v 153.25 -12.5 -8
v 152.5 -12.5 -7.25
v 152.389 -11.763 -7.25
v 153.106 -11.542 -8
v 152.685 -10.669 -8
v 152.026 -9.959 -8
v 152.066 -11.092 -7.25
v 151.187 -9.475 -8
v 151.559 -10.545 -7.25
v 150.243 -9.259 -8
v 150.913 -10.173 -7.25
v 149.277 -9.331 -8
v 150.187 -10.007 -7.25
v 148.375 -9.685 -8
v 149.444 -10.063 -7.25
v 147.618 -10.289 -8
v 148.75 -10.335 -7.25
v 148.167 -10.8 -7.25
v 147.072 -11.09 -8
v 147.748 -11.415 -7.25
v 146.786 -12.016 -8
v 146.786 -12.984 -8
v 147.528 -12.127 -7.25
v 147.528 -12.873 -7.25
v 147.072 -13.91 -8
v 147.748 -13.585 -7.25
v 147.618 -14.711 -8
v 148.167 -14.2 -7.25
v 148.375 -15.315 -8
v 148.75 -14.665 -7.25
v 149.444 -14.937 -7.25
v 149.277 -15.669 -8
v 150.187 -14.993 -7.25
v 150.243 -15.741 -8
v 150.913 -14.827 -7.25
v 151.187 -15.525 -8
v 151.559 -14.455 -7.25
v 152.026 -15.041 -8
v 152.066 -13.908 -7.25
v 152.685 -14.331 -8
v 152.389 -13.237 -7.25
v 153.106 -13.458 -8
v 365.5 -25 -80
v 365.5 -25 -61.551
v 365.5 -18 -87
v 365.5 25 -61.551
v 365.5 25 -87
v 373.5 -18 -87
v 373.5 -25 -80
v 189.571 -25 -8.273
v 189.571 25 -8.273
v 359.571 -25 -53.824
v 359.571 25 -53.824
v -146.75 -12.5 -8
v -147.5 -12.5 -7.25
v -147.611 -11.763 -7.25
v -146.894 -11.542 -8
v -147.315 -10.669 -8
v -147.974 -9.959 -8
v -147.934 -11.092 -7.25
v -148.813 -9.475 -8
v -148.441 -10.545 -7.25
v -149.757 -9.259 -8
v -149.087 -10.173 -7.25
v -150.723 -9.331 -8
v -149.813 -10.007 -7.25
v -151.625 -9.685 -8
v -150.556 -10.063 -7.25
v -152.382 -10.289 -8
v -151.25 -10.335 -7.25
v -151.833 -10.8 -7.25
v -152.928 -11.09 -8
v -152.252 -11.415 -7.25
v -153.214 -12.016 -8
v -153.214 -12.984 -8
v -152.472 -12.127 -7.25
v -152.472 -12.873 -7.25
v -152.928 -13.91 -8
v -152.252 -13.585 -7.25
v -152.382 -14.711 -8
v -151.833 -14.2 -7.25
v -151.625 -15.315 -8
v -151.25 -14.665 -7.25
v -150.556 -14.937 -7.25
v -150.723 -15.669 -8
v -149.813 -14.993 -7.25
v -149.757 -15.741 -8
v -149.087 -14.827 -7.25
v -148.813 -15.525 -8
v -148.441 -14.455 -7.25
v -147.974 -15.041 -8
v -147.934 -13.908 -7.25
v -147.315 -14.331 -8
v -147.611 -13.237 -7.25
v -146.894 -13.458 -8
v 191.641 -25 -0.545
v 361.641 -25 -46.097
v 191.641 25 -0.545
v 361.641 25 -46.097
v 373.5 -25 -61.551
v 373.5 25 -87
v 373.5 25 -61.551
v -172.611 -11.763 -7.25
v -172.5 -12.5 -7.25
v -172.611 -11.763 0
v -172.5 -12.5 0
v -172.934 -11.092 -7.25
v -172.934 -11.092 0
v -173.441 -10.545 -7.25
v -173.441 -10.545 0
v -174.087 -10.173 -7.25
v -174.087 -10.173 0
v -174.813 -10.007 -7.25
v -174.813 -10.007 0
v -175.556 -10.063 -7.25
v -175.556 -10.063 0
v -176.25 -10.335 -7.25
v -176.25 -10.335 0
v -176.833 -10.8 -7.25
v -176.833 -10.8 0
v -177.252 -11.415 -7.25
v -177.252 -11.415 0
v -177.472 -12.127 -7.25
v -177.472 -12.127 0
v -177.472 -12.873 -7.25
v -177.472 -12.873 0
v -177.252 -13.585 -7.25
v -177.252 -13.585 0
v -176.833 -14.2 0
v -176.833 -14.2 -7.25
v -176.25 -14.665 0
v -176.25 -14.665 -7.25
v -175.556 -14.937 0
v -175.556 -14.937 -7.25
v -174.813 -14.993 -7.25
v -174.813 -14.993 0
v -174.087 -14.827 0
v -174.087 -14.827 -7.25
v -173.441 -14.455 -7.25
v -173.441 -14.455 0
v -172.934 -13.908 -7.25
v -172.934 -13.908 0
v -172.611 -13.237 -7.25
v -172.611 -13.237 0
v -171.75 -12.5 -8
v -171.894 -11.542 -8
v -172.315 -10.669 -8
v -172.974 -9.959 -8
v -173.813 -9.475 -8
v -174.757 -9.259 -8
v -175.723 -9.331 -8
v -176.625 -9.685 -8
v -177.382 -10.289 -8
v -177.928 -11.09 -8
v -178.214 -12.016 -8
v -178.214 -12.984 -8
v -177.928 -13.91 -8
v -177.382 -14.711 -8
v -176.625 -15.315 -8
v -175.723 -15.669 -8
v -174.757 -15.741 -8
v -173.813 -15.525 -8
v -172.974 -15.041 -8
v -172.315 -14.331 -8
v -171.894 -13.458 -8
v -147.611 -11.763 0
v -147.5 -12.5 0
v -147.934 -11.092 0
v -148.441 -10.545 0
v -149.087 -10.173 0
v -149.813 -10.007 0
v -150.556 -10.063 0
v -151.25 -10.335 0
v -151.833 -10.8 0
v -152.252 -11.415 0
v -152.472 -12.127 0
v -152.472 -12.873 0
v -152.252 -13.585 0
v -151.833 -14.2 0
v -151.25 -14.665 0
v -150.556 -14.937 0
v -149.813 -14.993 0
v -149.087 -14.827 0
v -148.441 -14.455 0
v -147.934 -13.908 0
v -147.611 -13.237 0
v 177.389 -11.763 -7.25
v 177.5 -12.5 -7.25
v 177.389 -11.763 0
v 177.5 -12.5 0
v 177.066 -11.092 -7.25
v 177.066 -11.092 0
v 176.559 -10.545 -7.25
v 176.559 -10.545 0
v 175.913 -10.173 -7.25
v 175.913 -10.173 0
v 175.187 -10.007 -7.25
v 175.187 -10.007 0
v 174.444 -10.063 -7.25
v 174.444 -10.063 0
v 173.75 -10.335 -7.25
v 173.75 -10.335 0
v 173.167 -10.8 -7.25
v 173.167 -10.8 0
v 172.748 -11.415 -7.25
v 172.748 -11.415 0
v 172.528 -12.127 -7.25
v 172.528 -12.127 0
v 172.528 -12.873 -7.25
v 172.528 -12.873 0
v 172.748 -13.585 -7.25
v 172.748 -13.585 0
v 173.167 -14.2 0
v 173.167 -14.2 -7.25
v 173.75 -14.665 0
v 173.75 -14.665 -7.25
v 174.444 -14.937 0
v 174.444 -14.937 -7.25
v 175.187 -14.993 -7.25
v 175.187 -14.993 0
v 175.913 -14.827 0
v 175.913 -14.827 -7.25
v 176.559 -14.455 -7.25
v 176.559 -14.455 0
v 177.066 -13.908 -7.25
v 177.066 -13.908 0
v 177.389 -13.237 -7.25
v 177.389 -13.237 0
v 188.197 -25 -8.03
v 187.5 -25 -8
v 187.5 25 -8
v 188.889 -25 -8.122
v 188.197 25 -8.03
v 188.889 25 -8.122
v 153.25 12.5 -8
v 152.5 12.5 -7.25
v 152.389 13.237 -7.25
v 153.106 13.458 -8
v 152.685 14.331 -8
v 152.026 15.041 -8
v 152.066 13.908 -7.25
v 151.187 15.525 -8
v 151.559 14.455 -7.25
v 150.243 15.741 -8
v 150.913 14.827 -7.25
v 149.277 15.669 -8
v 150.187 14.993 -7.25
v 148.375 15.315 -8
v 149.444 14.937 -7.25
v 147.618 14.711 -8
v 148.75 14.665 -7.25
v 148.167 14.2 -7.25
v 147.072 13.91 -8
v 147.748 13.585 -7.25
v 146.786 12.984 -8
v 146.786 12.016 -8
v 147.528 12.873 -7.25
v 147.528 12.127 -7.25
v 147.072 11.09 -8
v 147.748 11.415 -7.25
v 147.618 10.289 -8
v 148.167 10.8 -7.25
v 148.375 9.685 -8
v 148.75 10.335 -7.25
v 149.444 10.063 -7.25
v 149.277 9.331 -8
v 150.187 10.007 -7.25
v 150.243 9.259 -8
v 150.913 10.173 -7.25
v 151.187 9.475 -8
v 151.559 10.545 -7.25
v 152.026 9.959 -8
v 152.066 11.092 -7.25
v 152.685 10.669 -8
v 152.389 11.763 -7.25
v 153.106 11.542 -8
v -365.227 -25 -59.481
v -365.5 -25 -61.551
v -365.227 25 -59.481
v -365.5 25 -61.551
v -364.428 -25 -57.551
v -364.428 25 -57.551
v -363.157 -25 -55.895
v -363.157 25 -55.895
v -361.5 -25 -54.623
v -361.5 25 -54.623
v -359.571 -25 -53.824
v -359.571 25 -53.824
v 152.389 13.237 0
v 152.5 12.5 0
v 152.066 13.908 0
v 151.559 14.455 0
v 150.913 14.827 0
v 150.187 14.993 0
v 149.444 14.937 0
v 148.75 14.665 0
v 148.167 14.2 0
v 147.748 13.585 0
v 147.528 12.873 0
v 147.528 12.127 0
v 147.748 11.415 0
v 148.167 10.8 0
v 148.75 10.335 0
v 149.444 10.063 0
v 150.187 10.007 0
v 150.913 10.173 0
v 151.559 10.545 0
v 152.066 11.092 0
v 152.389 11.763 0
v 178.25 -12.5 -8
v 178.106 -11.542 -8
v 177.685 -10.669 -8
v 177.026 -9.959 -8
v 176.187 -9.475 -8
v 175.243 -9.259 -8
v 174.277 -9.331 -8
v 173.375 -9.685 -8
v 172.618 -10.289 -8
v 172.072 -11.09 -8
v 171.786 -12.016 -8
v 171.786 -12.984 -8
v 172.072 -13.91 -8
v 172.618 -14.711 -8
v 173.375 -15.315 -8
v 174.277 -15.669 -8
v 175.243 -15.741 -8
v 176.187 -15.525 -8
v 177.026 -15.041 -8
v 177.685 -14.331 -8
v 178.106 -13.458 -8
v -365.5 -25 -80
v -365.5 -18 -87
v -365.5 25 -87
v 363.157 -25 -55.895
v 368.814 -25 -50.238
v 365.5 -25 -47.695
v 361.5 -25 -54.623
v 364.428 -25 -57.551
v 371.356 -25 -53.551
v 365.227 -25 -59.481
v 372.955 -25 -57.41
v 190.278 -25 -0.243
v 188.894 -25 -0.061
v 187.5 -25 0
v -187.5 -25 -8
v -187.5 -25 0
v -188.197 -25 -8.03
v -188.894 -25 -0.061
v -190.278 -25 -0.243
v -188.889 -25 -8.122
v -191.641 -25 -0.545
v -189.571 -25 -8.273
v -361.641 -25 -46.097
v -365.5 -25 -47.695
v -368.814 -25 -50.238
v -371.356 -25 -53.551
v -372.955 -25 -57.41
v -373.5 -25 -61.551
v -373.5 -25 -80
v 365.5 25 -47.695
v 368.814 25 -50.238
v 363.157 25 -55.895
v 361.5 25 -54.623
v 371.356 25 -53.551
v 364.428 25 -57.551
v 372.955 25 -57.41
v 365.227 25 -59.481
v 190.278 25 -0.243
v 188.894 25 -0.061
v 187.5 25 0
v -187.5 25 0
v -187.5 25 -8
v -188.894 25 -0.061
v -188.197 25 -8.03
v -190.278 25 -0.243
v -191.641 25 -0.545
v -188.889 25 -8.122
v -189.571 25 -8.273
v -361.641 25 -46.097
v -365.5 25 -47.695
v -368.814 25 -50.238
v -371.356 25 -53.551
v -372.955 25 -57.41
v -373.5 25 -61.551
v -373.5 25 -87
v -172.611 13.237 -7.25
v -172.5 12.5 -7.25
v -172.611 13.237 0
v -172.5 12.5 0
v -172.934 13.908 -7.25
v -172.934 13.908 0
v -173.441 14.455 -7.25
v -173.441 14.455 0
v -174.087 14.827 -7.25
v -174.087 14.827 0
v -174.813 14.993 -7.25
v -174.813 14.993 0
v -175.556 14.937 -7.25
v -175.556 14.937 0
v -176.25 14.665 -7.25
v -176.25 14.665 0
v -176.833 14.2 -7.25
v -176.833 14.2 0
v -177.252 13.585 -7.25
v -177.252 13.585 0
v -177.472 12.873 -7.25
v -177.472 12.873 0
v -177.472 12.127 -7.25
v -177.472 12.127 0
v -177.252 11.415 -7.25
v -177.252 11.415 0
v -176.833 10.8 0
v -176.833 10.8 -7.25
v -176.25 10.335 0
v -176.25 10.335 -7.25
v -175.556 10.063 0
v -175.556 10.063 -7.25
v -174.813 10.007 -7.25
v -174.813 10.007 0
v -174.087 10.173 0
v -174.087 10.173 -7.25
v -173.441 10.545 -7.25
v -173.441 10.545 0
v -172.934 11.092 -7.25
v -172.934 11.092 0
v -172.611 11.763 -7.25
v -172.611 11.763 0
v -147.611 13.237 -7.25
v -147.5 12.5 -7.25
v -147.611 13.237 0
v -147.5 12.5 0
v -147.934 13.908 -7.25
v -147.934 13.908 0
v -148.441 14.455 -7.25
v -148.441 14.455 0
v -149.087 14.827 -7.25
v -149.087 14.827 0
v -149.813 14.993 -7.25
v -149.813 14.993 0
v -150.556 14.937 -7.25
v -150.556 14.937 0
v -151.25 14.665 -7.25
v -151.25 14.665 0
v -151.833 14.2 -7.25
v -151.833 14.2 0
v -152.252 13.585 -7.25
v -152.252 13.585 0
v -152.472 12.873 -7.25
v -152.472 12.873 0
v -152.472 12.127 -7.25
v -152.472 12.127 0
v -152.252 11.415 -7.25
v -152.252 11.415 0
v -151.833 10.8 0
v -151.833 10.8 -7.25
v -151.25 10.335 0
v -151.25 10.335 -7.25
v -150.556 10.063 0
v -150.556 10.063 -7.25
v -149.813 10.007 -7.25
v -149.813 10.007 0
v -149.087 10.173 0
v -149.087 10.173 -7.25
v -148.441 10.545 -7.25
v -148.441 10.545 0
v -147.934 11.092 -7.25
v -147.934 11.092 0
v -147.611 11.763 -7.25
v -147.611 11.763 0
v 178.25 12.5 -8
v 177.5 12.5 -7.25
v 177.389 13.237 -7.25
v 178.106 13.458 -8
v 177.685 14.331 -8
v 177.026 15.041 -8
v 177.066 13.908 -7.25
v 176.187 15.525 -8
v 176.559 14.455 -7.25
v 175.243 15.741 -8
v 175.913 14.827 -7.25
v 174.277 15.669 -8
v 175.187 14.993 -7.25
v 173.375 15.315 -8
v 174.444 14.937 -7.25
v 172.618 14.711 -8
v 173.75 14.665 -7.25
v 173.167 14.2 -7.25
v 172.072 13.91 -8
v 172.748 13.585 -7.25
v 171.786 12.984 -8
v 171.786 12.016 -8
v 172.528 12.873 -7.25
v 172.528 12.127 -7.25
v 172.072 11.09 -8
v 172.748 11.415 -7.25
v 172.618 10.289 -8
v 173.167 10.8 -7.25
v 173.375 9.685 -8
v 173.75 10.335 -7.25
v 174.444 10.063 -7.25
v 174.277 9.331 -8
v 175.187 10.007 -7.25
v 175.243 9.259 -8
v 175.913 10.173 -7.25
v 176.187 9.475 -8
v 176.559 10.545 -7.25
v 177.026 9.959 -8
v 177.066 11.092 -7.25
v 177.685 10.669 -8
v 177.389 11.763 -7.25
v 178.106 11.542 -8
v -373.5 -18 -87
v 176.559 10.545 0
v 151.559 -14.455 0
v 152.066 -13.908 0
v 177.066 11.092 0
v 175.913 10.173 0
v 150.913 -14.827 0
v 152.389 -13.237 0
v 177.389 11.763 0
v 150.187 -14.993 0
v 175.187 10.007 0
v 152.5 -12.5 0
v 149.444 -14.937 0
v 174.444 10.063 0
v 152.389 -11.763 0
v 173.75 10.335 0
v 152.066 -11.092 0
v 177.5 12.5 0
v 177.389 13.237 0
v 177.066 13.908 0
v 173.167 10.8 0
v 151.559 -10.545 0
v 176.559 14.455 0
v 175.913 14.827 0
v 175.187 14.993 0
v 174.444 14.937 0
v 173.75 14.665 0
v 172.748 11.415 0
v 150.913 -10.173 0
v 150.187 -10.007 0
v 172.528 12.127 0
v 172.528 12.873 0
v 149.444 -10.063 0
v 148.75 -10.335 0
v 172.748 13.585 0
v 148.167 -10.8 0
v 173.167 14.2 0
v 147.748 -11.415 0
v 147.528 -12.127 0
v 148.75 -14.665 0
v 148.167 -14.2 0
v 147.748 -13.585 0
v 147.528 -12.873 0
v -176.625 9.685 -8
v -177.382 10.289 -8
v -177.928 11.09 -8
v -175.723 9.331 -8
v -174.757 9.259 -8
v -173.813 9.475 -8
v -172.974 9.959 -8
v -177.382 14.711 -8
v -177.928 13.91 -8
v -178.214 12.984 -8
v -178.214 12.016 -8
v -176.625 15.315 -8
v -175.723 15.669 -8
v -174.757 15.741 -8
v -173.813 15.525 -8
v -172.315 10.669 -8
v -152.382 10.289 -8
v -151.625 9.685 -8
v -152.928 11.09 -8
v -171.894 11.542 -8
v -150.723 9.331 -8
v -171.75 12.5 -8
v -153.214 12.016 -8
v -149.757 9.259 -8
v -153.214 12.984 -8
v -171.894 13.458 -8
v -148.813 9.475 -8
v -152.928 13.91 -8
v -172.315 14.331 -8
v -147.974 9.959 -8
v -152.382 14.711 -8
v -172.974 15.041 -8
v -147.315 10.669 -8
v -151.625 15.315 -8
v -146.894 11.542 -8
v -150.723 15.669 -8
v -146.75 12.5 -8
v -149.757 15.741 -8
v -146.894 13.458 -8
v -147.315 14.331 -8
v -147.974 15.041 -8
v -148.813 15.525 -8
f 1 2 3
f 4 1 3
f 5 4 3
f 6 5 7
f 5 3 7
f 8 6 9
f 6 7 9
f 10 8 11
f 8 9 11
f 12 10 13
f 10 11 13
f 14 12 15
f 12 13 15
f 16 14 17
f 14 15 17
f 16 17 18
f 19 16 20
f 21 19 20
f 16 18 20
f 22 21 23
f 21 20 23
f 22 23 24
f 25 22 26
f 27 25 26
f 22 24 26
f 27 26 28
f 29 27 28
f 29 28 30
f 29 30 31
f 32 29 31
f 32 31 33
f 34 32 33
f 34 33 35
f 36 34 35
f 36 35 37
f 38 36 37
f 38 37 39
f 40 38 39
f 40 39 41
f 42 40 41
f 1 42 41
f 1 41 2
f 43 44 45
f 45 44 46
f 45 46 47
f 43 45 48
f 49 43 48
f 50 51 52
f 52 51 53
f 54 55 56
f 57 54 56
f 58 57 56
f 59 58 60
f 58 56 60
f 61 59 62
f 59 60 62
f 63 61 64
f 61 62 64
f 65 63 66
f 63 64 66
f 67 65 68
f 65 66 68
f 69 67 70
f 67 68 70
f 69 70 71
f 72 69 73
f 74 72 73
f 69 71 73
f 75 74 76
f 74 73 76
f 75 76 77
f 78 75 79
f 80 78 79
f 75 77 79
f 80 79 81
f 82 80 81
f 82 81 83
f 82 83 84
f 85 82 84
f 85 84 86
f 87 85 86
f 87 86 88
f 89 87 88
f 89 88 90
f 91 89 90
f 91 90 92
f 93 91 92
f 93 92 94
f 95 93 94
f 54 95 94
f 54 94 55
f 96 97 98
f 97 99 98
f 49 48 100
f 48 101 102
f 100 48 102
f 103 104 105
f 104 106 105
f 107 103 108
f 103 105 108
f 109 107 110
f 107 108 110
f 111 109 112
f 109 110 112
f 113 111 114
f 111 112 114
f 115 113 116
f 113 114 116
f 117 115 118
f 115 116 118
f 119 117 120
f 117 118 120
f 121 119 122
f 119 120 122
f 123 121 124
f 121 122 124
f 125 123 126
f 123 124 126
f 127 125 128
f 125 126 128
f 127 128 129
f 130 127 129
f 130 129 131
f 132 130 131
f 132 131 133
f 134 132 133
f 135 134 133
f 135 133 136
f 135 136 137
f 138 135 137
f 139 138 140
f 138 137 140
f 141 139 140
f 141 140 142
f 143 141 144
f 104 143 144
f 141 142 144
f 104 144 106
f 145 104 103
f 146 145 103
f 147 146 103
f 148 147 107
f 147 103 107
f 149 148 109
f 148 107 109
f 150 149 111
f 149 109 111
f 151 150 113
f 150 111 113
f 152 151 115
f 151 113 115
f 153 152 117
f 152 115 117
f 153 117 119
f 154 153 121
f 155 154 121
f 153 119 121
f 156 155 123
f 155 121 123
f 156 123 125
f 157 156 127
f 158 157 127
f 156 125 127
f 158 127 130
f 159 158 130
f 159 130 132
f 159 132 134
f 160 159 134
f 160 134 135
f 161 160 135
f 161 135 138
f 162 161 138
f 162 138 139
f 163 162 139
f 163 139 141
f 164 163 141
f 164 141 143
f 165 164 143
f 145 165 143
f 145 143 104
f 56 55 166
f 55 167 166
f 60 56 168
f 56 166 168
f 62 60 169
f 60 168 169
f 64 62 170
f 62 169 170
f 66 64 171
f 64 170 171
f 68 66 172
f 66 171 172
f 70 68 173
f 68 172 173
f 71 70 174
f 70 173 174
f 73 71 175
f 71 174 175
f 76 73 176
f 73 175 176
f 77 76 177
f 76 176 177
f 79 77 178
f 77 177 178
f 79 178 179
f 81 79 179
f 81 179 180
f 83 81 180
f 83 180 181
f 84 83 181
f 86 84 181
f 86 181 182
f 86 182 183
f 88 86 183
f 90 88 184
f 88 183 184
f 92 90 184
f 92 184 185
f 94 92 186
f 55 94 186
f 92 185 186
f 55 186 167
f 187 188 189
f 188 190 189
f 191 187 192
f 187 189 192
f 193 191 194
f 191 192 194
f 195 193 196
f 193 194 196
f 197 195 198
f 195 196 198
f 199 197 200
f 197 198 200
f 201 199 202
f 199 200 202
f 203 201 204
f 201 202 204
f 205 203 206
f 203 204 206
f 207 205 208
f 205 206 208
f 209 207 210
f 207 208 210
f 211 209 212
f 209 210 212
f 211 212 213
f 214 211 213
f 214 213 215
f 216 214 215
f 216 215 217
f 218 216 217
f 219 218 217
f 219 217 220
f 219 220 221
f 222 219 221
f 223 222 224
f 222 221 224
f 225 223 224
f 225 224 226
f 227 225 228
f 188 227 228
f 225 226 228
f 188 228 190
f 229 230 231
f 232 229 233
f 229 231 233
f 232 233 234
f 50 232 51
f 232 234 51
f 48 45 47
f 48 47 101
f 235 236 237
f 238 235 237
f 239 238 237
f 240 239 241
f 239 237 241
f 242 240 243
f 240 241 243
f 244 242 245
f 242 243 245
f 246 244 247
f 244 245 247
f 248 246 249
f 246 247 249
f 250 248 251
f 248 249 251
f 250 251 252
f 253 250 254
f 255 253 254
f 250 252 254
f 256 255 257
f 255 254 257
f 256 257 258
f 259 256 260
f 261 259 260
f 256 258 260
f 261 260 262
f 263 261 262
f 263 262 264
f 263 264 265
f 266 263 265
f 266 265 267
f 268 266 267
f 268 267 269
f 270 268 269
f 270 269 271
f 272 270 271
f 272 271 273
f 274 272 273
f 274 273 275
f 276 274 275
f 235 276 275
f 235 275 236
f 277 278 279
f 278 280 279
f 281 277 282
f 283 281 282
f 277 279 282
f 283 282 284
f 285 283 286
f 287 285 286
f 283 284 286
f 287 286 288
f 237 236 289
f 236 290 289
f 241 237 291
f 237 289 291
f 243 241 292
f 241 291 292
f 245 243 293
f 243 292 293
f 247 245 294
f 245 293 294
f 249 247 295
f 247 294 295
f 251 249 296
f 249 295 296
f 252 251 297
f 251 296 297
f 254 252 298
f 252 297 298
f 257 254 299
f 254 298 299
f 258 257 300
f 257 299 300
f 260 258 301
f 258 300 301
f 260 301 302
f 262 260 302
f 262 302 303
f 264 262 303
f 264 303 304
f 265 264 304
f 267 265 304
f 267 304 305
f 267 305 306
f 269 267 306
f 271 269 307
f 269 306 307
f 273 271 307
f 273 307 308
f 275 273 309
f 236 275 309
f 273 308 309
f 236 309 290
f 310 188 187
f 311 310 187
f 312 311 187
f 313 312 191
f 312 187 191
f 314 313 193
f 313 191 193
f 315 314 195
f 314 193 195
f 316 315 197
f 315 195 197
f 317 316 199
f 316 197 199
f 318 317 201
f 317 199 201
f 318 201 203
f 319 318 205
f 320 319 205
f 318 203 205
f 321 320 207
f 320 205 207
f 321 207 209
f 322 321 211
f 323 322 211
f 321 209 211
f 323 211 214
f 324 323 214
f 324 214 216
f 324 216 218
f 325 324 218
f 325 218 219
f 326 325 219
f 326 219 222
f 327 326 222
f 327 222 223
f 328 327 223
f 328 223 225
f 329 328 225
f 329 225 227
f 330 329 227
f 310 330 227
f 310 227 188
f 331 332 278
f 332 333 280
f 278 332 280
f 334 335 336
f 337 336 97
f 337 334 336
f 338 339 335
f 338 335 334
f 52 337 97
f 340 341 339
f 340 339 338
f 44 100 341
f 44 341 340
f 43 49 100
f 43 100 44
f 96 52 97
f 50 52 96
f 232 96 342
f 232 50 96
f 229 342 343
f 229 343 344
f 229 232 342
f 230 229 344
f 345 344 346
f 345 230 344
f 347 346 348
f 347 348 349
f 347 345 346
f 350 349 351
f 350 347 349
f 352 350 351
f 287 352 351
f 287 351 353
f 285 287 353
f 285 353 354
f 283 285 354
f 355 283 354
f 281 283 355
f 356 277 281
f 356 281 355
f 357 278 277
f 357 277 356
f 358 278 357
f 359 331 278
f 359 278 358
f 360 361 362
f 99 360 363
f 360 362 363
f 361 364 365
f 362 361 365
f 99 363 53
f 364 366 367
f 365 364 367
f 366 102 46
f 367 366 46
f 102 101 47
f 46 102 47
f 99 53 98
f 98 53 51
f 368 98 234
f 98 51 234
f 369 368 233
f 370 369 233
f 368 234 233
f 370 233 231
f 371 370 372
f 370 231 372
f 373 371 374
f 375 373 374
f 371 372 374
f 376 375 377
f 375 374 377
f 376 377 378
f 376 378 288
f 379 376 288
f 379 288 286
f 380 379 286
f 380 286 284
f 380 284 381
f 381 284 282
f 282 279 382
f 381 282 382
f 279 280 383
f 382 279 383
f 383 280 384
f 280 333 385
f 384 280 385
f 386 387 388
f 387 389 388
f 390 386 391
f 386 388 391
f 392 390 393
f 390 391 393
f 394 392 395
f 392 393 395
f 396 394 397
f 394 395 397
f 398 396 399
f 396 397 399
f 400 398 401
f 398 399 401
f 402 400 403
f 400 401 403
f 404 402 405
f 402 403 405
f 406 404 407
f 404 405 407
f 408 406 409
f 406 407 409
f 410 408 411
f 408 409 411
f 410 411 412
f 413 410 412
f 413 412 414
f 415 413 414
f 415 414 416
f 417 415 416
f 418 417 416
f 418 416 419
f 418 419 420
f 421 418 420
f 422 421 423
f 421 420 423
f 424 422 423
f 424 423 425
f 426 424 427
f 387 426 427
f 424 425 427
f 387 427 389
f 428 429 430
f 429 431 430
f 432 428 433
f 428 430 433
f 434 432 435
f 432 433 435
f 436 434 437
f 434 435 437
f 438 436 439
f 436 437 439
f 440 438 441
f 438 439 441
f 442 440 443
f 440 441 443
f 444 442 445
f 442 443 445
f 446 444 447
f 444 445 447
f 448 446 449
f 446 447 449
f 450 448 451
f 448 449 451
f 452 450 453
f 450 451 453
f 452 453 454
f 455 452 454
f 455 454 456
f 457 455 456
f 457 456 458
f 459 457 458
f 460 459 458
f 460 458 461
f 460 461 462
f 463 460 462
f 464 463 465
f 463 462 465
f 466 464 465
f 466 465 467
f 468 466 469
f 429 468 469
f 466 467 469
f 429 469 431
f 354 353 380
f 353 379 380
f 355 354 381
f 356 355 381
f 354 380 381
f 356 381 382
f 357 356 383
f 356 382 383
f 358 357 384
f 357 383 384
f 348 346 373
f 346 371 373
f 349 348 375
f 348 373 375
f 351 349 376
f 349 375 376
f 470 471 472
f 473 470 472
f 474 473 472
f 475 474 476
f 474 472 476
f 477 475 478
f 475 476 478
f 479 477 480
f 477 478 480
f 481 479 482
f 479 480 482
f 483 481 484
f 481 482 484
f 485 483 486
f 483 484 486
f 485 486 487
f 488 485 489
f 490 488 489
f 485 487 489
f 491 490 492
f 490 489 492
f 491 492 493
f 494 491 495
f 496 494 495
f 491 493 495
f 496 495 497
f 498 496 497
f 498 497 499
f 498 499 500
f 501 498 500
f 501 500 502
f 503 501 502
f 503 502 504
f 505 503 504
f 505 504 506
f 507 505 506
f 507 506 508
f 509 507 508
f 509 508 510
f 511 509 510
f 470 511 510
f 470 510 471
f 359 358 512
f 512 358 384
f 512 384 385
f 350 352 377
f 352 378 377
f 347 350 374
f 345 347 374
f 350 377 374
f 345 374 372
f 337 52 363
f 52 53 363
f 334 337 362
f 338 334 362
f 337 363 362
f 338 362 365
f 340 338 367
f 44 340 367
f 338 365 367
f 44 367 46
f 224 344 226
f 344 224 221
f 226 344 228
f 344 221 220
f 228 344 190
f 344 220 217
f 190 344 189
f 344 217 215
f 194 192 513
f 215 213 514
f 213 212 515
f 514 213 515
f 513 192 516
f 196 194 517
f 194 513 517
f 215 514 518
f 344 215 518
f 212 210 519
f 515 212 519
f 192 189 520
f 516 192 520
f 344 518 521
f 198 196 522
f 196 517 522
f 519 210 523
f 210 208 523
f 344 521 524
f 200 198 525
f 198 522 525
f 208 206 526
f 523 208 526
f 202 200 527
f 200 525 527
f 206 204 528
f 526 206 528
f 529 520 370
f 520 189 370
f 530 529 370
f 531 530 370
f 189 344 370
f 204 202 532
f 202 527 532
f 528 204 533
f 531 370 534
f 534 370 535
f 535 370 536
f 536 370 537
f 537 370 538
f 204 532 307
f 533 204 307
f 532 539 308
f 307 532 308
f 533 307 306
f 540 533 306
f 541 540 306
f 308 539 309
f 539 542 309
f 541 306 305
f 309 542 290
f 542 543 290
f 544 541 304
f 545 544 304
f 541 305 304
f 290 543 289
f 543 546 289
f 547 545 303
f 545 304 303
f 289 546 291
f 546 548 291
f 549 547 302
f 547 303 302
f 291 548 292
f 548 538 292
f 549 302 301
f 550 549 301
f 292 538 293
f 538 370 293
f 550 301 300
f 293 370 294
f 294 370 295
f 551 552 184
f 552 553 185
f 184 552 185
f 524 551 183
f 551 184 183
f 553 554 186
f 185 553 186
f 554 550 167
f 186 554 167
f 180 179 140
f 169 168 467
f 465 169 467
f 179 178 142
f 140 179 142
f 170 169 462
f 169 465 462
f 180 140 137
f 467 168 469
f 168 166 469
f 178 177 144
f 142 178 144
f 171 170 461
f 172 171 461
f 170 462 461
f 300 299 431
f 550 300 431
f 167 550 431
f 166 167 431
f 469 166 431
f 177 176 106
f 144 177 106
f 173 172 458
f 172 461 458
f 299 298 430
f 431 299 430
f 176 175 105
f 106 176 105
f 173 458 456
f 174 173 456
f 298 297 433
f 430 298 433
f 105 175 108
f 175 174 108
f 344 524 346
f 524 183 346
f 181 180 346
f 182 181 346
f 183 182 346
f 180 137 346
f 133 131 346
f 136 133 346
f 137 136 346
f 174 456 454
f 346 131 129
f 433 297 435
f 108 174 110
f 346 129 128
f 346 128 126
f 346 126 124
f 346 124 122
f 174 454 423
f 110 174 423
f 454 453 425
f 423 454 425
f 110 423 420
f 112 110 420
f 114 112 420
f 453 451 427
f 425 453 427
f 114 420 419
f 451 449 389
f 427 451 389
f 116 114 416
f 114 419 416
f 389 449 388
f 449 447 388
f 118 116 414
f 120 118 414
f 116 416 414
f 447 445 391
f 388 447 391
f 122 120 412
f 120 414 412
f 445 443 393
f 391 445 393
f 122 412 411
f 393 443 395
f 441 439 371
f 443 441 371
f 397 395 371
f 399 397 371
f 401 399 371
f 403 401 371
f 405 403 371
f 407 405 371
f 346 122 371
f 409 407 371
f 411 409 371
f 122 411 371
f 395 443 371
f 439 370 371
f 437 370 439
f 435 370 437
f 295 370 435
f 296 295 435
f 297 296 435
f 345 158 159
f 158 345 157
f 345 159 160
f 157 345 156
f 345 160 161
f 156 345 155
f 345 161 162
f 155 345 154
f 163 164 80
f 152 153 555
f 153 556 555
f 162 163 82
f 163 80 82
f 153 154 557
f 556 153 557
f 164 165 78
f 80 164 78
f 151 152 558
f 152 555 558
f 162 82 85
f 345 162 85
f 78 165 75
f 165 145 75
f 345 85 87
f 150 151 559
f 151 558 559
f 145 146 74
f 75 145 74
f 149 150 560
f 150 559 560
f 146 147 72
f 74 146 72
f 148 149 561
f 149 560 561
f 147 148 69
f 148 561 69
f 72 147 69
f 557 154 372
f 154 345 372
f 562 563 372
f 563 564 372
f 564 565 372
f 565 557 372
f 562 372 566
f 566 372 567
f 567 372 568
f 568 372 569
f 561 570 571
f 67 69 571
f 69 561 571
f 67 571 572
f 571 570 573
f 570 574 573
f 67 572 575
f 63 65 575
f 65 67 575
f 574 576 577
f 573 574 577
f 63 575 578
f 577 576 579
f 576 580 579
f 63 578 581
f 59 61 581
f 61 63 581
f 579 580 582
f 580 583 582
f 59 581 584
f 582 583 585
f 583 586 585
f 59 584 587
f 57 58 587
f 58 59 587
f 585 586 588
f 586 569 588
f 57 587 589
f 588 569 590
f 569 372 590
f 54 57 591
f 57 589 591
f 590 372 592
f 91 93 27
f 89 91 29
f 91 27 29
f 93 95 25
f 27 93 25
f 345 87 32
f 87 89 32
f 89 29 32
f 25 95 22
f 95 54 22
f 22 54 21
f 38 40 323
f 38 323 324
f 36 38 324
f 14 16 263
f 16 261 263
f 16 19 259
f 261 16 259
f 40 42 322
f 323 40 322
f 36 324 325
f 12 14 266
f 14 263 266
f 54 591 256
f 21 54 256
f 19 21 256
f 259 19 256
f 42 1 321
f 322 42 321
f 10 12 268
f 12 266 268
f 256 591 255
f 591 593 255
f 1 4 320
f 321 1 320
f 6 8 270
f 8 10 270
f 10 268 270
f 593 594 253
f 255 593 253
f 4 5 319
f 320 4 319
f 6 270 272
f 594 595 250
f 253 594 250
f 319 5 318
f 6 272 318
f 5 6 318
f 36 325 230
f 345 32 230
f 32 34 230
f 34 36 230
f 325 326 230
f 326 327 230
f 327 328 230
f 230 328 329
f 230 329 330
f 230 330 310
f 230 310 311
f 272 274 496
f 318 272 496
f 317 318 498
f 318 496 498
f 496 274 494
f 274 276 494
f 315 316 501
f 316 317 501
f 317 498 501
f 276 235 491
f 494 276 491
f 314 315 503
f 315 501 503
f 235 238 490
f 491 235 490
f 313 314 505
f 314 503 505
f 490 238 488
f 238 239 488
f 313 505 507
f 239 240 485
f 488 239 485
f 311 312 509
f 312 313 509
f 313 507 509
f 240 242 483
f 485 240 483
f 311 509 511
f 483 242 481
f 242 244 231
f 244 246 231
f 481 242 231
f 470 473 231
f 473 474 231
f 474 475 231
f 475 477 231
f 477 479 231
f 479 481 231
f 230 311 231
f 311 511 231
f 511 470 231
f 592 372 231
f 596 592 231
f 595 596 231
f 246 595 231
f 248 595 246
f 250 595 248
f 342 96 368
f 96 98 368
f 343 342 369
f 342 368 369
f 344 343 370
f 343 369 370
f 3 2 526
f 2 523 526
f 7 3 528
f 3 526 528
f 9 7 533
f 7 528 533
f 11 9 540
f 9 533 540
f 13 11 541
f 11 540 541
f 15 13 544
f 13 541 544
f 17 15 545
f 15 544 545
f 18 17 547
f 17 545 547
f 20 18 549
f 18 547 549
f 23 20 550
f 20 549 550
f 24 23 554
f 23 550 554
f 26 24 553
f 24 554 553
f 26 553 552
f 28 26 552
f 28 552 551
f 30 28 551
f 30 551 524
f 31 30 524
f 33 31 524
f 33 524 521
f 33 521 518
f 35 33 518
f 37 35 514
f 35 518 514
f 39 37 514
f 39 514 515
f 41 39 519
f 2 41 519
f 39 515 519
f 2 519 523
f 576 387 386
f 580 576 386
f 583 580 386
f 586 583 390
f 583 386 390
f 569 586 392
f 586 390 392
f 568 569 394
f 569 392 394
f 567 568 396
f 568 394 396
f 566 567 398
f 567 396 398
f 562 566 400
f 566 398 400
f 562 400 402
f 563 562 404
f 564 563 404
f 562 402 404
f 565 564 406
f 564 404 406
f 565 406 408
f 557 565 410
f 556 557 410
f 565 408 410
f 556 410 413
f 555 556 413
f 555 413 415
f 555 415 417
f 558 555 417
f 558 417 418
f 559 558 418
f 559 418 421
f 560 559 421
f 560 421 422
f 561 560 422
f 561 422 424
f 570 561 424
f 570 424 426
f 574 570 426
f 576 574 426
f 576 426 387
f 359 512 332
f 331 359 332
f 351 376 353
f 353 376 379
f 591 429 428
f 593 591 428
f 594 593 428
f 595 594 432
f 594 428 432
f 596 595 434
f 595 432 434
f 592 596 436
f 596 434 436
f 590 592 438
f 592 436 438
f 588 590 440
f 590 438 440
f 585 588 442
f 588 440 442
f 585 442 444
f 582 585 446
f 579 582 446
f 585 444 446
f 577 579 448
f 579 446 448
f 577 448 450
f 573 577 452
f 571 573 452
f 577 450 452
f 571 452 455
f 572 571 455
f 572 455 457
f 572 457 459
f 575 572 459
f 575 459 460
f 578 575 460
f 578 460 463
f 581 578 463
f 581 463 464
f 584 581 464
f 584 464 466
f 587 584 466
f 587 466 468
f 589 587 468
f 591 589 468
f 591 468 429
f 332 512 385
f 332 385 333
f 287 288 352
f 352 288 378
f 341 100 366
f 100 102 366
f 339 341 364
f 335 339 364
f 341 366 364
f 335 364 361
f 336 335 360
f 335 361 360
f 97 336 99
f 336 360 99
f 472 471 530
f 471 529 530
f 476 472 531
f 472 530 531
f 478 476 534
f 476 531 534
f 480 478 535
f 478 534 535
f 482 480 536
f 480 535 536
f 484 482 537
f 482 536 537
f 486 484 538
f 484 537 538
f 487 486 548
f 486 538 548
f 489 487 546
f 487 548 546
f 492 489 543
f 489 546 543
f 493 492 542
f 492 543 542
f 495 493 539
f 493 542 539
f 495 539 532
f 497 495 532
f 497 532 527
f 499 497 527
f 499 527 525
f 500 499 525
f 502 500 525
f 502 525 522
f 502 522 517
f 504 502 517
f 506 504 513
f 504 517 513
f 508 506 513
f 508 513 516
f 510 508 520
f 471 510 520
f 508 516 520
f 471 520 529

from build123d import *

# Parameters (mm, degrees)
SM_BASE_FLANGE_2_DEPTH = 25
M6X1_01_D              = 5
M6X1_01_CSINK_D        = 6.5
M6X1_01_CSINK_ANGLE    = 90
CHAMFER_1_SIZE         = 7


# Sheet-metal steps are written as plain solids
with BuildPart() as part:
    # Sketch 2 → Базовая кромка2 (new, symmetric)
    with BuildSketch(Plane(origin=(0, 0, 0), x_dir=(1, 0, 0), z_dir=(0, 1, 0))):
        with BuildLine():
            Line((-365.5, 87), (-365.5, 61.551362713))
            ThreePointArc((-365.5, 61.551362713), (-363.846826722, 56.681271281), (-359.570552361, 53.823956103))
            Line((-359.570552361, 53.823956103), (-189.570552361, 8.27259339))
            ThreePointArc((-189.570552361, 8.27259339), (-188.544209538, 8.068441109), (-187.5, 8))
            Line((-187.5, 8), (187.5, 8))
            ThreePointArc((187.5, 8), (188.544209538, 8.068441109), (189.570552361, 8.27259339))
            Line((189.570552361, 8.27259339), (359.570552361, 53.823956103))
            ThreePointArc((359.570552361, 53.823956103), (363.846826722, 56.681271281), (365.5, 61.551362713))
            Line((365.5, 61.551362713), (365.5, 87))
            Line((365.5, 87), (373.5, 87))
            Line((373.5, 87), (373.5, 61.551362713))
            ThreePointArc((373.5, 61.551362713), (370.193653445, 51.811179849), (361.641104722, 46.096549493))
            Line((361.641104722, 46.096549493), (191.641104722, 0.545186779))
            ThreePointArc((191.641104722, 0.545186779), (189.588419076, 0.136882218), (187.5, 0))
            Line((187.5, 0), (-187.5, 0))
            ThreePointArc((-187.5, 0), (-189.588419076, 0.136882218), (-191.641104722, 0.545186779))
            Line((-191.641104722, 0.545186779), (-361.641104722, 46.096549493))
            ThreePointArc((-361.641104722, 46.096549493), (-370.193653445, 51.811179849), (-373.5, 61.551362713))
            Line((-373.5, 61.551362713), (-373.5, 87))
            Line((-373.5, 87), (-365.5, 87))
        make_face()
    extrude(amount=SM_BASE_FLANGE_2_DEPTH, both=True)

    # Отверстие обработанное метчиком M6x1.01 (through all)
    with Locations(Plane(origin=(175, 12.5, -8), x_dir=(-1, 0, 0), z_dir=(0, 0, -1))):
        with Locations((0, 0), (25, 0), (25, -25), (0, -25), (325, 0), (350, 0), (350, -25), (325, -25)):
            CounterSinkHole(M6X1_01_D / 2, M6X1_01_CSINK_D / 2, counter_sink_angle=M6X1_01_CSINK_ANGLE)

    # Фаска1
    chamfer_1_edges = [part.edges().sort_by_distance(p)[0] for p in [
        (369.5, -25, -87),
        (-369.5, -25, -87),
    ]]
    chamfer(chamfer_1_edges, length=CHAMFER_1_SIZE)


solid = part.part
